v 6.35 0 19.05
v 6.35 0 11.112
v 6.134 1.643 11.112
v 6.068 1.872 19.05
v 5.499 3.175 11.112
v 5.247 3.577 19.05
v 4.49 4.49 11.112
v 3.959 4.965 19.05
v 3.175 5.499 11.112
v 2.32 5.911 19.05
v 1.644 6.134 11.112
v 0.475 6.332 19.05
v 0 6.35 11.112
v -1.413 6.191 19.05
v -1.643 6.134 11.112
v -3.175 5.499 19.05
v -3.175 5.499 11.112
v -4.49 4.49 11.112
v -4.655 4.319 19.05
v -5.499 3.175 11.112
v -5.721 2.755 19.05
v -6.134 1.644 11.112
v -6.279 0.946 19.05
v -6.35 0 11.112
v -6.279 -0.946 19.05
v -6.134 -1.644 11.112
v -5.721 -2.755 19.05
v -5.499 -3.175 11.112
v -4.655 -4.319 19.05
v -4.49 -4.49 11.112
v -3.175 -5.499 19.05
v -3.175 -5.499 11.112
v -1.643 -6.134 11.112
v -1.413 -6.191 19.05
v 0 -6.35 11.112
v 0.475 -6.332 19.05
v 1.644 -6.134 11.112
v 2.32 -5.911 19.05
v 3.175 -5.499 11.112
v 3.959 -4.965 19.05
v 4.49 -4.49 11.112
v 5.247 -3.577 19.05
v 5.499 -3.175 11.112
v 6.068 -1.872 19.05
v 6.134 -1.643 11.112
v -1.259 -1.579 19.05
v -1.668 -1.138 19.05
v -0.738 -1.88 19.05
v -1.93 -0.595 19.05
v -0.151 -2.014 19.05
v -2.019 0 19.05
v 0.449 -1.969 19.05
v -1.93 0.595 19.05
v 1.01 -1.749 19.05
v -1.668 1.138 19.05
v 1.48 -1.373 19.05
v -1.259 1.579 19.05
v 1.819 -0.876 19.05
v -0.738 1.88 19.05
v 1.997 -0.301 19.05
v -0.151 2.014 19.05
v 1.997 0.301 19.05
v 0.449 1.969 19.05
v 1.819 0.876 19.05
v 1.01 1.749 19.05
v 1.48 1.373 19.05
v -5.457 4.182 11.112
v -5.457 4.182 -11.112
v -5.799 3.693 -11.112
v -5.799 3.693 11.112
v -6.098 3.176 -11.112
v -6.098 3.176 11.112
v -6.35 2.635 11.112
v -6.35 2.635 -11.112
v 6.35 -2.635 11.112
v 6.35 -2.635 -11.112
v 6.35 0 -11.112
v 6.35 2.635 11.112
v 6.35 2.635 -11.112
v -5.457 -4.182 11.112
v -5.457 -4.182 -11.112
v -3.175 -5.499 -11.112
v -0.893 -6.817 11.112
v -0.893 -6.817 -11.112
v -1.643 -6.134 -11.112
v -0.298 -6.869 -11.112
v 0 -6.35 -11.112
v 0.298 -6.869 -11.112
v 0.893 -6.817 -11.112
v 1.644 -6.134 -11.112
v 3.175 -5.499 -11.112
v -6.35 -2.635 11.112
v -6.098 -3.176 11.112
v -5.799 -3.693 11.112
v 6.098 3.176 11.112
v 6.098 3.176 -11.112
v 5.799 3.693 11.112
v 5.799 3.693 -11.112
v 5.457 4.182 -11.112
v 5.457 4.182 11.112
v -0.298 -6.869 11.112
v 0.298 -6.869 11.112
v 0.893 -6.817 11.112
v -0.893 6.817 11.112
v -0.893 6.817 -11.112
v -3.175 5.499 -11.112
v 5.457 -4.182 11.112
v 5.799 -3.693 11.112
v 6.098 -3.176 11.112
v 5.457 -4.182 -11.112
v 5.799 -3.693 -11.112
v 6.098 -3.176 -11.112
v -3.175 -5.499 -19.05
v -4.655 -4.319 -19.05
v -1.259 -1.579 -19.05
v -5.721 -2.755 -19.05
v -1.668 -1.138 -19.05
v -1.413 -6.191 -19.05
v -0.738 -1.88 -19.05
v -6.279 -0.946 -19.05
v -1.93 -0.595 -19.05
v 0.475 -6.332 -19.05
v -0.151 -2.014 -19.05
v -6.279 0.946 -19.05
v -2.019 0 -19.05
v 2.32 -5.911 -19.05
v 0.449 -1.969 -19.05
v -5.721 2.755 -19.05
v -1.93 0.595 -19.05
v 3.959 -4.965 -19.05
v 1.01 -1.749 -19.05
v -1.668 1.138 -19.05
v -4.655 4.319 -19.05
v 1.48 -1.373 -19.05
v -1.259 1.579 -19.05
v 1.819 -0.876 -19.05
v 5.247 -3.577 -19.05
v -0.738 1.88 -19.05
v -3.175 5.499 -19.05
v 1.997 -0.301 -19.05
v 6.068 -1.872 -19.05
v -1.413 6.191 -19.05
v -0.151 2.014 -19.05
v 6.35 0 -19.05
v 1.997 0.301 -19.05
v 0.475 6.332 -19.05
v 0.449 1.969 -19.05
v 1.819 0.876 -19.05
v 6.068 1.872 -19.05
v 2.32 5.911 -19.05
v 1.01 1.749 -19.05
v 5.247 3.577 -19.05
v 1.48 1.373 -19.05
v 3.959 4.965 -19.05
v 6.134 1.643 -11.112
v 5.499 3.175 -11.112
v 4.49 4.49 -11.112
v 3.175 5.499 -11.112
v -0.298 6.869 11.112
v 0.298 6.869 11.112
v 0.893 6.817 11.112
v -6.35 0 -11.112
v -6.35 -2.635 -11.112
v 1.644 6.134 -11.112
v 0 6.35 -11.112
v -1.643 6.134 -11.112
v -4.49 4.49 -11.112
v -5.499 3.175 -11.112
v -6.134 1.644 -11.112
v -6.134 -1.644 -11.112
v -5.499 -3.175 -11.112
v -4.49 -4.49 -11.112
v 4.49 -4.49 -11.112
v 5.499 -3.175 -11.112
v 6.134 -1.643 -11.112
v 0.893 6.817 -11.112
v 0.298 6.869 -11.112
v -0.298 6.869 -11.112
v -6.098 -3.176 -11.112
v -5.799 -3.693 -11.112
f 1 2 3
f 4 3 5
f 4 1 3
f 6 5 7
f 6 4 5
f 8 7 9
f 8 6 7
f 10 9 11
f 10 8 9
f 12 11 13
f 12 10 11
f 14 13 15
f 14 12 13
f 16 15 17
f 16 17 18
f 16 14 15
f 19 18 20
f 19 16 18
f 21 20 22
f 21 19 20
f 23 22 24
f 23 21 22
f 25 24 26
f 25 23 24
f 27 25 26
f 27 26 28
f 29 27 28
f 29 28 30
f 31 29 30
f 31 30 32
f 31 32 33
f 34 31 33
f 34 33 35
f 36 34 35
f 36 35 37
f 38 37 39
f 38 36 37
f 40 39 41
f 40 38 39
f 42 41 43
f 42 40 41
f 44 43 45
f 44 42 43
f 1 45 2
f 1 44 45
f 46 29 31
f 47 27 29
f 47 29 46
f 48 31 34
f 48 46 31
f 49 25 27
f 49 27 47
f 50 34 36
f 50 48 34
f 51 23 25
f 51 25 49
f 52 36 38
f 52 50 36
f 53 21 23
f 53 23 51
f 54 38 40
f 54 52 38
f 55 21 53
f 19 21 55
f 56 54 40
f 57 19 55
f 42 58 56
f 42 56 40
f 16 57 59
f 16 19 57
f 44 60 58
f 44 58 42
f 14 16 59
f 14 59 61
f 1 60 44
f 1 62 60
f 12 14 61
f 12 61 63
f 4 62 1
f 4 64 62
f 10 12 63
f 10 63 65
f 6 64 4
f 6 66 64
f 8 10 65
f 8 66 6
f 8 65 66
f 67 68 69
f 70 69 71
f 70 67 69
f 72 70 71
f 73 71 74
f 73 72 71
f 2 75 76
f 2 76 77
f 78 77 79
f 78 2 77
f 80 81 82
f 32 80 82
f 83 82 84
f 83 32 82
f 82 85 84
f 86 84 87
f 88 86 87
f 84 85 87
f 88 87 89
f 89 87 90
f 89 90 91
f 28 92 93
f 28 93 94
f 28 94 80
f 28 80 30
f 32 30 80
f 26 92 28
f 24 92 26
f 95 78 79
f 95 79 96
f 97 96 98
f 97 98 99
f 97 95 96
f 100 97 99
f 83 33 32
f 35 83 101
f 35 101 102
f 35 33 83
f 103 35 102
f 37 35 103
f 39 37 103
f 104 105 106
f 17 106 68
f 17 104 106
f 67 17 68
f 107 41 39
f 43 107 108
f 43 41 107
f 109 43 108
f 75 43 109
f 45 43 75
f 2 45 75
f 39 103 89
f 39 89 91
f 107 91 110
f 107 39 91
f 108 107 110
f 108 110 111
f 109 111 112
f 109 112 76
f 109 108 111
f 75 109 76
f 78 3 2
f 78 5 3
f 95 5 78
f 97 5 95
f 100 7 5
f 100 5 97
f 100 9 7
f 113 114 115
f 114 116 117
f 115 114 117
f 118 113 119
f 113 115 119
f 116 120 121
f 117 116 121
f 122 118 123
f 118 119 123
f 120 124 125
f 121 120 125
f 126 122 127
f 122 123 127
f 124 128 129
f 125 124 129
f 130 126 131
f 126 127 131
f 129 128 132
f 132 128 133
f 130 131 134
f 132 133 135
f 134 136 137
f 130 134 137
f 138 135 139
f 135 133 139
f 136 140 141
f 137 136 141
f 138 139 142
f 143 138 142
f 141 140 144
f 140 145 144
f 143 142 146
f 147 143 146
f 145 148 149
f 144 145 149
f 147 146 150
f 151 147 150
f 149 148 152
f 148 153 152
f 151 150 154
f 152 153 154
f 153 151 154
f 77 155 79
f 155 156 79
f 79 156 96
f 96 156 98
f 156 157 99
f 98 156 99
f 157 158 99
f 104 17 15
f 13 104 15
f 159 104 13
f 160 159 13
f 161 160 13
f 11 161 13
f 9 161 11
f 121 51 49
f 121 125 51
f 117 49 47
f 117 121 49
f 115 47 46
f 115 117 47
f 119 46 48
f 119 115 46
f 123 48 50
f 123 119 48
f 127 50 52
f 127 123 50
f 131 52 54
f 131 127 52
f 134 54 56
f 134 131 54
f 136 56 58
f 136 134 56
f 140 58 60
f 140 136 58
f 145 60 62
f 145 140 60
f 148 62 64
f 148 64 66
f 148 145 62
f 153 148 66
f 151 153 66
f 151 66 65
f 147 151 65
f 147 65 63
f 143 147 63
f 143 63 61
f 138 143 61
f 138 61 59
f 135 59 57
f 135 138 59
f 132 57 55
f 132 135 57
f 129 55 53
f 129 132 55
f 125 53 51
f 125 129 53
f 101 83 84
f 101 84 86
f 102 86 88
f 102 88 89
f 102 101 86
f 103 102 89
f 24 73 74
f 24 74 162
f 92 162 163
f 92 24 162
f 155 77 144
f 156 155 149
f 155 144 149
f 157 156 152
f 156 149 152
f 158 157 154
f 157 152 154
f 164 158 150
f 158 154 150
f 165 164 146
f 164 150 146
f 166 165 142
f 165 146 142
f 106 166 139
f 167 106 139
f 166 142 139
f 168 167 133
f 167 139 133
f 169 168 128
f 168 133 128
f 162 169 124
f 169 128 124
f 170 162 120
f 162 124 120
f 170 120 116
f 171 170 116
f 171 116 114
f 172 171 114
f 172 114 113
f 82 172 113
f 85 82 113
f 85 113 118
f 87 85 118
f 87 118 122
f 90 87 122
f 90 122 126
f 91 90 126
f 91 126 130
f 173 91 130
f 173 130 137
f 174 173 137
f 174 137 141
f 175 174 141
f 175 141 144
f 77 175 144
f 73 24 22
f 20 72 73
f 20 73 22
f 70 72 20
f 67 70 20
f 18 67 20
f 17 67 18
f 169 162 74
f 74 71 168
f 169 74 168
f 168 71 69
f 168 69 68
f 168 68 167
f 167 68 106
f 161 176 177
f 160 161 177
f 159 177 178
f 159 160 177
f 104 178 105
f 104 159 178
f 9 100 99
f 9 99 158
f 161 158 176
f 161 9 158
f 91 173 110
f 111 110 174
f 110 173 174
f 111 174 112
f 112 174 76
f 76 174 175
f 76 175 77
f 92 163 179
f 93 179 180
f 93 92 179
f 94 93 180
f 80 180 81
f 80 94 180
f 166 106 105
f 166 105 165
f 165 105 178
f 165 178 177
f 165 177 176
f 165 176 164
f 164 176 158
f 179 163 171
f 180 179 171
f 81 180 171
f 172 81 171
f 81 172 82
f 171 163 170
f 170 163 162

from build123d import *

# Parameters (mm, degrees)
SKETCH1_R                            = 2.0193
BOSS_EXTRUDE1_DEPTH                  = 19.05
F_10_32_TAPPED_HOLE1_D               = 4.0386
F_10_32_TAPPED_HOLE1_DEPTH           = 12.02944
F_10_32_TAPPED_HOLE1_TIP             = 1.213317848
F_10_32_TAPPED_HOLE1_ON_FACE_2_D     = 4.0386
F_10_32_TAPPED_HOLE1_ON_FACE_2_DEPTH = 12.02944
F_10_32_TAPPED_HOLE1_ON_FACE_2_TIP   = 1.213317848
SKETCH5_R                            = 6.874999966
SKETCH5_R_2                          = 6.35
CUT_EXTRUDE1_DEPTH                   = 7.9375


with BuildPart() as part:
    # Sketch1 → Boss-Extrude1 (new, symmetric)
    with BuildSketch(Plane.XY):
        with BuildLine():
            ThreePointArc((0.893039571, 6.816751782), (0, 6.874999966), (-0.893039571, 6.816751782))
            Line((-0.893039571, 6.816751782), (-5.456960429, 4.181770846))
            ThreePointArc((-5.456960429, 4.181770846), (-5.953924622, 3.437499983), (-6.35, 2.634980936))
            Line((-6.35, 2.634980936), (-6.35, -2.634980936))
            ThreePointArc((-6.35, -2.634980936), (-5.953924622, -3.437499983), (-5.456960429, -4.181770846))
            Line((-5.456960429, -4.181770846), (-0.893039571, -6.816751782))
            ThreePointArc((-0.893039571, -6.816751782), (0, -6.874999966), (0.893039571, -6.816751782))
            Line((0.893039571, -6.816751782), (5.456960429, -4.181770846))
            ThreePointArc((5.456960429, -4.181770846), (5.953924622, -3.437499983), (6.35, -2.634980936))
            Line((6.35, -2.634980936), (6.35, 2.634980936))
            ThreePointArc((6.35, 2.634980936), (5.953924622, 3.437499983), (5.456960429, 4.181770846))
            Line((5.456960429, 4.181770846), (0.893039571, 6.816751782))
        make_face()
        with Locations(Location((0, 0, 0), (0, 0, 180))):
            Circle(SKETCH1_R, mode=Mode.SUBTRACT)
    extrude(amount=BOSS_EXTRUDE1_DEPTH, both=True)

    # #10-32 Tapped Hole1
    with Locations(Plane.XY.offset(19.05)):
        with Locations((0, 0)):
            Hole(F_10_32_TAPPED_HOLE1_D / 2, depth=F_10_32_TAPPED_HOLE1_DEPTH)
            with Locations((0, 0, -(F_10_32_TAPPED_HOLE1_DEPTH + F_10_32_TAPPED_HOLE1_TIP / 2))):  # 118° drill point
                Cone(0, F_10_32_TAPPED_HOLE1_D / 2, F_10_32_TAPPED_HOLE1_TIP, mode=Mode.SUBTRACT)

    # #10-32 Tapped Hole1 on face 2
    with Locations(Plane.XY.offset(-19.05)):
        with Locations((0, 0)):
            Hole(F_10_32_TAPPED_HOLE1_ON_FACE_2_D / 2, depth=F_10_32_TAPPED_HOLE1_ON_FACE_2_DEPTH)
            with Locations((0, 0, -(F_10_32_TAPPED_HOLE1_ON_FACE_2_DEPTH + F_10_32_TAPPED_HOLE1_ON_FACE_2_TIP / 2))):  # 118° drill point
                Cone(0, F_10_32_TAPPED_HOLE1_ON_FACE_2_D / 2, F_10_32_TAPPED_HOLE1_ON_FACE_2_TIP, mode=Mode.SUBTRACT)

    # Sketch5 → Cut-Extrude1 (cut)
    with BuildSketch(Plane.XY.offset(19.05)):
        Circle(SKETCH5_R)
        Circle(SKETCH5_R_2, mode=Mode.SUBTRACT)
    cut_extrude1 = extrude(amount=-CUT_EXTRUDE1_DEPTH, mode=Mode.SUBTRACT)

    # Mirror1: Cut-Extrude1 across plane
    add(cut_extrude1.mirror(Plane.XY), mode=Mode.SUBTRACT)


solid = part.part
